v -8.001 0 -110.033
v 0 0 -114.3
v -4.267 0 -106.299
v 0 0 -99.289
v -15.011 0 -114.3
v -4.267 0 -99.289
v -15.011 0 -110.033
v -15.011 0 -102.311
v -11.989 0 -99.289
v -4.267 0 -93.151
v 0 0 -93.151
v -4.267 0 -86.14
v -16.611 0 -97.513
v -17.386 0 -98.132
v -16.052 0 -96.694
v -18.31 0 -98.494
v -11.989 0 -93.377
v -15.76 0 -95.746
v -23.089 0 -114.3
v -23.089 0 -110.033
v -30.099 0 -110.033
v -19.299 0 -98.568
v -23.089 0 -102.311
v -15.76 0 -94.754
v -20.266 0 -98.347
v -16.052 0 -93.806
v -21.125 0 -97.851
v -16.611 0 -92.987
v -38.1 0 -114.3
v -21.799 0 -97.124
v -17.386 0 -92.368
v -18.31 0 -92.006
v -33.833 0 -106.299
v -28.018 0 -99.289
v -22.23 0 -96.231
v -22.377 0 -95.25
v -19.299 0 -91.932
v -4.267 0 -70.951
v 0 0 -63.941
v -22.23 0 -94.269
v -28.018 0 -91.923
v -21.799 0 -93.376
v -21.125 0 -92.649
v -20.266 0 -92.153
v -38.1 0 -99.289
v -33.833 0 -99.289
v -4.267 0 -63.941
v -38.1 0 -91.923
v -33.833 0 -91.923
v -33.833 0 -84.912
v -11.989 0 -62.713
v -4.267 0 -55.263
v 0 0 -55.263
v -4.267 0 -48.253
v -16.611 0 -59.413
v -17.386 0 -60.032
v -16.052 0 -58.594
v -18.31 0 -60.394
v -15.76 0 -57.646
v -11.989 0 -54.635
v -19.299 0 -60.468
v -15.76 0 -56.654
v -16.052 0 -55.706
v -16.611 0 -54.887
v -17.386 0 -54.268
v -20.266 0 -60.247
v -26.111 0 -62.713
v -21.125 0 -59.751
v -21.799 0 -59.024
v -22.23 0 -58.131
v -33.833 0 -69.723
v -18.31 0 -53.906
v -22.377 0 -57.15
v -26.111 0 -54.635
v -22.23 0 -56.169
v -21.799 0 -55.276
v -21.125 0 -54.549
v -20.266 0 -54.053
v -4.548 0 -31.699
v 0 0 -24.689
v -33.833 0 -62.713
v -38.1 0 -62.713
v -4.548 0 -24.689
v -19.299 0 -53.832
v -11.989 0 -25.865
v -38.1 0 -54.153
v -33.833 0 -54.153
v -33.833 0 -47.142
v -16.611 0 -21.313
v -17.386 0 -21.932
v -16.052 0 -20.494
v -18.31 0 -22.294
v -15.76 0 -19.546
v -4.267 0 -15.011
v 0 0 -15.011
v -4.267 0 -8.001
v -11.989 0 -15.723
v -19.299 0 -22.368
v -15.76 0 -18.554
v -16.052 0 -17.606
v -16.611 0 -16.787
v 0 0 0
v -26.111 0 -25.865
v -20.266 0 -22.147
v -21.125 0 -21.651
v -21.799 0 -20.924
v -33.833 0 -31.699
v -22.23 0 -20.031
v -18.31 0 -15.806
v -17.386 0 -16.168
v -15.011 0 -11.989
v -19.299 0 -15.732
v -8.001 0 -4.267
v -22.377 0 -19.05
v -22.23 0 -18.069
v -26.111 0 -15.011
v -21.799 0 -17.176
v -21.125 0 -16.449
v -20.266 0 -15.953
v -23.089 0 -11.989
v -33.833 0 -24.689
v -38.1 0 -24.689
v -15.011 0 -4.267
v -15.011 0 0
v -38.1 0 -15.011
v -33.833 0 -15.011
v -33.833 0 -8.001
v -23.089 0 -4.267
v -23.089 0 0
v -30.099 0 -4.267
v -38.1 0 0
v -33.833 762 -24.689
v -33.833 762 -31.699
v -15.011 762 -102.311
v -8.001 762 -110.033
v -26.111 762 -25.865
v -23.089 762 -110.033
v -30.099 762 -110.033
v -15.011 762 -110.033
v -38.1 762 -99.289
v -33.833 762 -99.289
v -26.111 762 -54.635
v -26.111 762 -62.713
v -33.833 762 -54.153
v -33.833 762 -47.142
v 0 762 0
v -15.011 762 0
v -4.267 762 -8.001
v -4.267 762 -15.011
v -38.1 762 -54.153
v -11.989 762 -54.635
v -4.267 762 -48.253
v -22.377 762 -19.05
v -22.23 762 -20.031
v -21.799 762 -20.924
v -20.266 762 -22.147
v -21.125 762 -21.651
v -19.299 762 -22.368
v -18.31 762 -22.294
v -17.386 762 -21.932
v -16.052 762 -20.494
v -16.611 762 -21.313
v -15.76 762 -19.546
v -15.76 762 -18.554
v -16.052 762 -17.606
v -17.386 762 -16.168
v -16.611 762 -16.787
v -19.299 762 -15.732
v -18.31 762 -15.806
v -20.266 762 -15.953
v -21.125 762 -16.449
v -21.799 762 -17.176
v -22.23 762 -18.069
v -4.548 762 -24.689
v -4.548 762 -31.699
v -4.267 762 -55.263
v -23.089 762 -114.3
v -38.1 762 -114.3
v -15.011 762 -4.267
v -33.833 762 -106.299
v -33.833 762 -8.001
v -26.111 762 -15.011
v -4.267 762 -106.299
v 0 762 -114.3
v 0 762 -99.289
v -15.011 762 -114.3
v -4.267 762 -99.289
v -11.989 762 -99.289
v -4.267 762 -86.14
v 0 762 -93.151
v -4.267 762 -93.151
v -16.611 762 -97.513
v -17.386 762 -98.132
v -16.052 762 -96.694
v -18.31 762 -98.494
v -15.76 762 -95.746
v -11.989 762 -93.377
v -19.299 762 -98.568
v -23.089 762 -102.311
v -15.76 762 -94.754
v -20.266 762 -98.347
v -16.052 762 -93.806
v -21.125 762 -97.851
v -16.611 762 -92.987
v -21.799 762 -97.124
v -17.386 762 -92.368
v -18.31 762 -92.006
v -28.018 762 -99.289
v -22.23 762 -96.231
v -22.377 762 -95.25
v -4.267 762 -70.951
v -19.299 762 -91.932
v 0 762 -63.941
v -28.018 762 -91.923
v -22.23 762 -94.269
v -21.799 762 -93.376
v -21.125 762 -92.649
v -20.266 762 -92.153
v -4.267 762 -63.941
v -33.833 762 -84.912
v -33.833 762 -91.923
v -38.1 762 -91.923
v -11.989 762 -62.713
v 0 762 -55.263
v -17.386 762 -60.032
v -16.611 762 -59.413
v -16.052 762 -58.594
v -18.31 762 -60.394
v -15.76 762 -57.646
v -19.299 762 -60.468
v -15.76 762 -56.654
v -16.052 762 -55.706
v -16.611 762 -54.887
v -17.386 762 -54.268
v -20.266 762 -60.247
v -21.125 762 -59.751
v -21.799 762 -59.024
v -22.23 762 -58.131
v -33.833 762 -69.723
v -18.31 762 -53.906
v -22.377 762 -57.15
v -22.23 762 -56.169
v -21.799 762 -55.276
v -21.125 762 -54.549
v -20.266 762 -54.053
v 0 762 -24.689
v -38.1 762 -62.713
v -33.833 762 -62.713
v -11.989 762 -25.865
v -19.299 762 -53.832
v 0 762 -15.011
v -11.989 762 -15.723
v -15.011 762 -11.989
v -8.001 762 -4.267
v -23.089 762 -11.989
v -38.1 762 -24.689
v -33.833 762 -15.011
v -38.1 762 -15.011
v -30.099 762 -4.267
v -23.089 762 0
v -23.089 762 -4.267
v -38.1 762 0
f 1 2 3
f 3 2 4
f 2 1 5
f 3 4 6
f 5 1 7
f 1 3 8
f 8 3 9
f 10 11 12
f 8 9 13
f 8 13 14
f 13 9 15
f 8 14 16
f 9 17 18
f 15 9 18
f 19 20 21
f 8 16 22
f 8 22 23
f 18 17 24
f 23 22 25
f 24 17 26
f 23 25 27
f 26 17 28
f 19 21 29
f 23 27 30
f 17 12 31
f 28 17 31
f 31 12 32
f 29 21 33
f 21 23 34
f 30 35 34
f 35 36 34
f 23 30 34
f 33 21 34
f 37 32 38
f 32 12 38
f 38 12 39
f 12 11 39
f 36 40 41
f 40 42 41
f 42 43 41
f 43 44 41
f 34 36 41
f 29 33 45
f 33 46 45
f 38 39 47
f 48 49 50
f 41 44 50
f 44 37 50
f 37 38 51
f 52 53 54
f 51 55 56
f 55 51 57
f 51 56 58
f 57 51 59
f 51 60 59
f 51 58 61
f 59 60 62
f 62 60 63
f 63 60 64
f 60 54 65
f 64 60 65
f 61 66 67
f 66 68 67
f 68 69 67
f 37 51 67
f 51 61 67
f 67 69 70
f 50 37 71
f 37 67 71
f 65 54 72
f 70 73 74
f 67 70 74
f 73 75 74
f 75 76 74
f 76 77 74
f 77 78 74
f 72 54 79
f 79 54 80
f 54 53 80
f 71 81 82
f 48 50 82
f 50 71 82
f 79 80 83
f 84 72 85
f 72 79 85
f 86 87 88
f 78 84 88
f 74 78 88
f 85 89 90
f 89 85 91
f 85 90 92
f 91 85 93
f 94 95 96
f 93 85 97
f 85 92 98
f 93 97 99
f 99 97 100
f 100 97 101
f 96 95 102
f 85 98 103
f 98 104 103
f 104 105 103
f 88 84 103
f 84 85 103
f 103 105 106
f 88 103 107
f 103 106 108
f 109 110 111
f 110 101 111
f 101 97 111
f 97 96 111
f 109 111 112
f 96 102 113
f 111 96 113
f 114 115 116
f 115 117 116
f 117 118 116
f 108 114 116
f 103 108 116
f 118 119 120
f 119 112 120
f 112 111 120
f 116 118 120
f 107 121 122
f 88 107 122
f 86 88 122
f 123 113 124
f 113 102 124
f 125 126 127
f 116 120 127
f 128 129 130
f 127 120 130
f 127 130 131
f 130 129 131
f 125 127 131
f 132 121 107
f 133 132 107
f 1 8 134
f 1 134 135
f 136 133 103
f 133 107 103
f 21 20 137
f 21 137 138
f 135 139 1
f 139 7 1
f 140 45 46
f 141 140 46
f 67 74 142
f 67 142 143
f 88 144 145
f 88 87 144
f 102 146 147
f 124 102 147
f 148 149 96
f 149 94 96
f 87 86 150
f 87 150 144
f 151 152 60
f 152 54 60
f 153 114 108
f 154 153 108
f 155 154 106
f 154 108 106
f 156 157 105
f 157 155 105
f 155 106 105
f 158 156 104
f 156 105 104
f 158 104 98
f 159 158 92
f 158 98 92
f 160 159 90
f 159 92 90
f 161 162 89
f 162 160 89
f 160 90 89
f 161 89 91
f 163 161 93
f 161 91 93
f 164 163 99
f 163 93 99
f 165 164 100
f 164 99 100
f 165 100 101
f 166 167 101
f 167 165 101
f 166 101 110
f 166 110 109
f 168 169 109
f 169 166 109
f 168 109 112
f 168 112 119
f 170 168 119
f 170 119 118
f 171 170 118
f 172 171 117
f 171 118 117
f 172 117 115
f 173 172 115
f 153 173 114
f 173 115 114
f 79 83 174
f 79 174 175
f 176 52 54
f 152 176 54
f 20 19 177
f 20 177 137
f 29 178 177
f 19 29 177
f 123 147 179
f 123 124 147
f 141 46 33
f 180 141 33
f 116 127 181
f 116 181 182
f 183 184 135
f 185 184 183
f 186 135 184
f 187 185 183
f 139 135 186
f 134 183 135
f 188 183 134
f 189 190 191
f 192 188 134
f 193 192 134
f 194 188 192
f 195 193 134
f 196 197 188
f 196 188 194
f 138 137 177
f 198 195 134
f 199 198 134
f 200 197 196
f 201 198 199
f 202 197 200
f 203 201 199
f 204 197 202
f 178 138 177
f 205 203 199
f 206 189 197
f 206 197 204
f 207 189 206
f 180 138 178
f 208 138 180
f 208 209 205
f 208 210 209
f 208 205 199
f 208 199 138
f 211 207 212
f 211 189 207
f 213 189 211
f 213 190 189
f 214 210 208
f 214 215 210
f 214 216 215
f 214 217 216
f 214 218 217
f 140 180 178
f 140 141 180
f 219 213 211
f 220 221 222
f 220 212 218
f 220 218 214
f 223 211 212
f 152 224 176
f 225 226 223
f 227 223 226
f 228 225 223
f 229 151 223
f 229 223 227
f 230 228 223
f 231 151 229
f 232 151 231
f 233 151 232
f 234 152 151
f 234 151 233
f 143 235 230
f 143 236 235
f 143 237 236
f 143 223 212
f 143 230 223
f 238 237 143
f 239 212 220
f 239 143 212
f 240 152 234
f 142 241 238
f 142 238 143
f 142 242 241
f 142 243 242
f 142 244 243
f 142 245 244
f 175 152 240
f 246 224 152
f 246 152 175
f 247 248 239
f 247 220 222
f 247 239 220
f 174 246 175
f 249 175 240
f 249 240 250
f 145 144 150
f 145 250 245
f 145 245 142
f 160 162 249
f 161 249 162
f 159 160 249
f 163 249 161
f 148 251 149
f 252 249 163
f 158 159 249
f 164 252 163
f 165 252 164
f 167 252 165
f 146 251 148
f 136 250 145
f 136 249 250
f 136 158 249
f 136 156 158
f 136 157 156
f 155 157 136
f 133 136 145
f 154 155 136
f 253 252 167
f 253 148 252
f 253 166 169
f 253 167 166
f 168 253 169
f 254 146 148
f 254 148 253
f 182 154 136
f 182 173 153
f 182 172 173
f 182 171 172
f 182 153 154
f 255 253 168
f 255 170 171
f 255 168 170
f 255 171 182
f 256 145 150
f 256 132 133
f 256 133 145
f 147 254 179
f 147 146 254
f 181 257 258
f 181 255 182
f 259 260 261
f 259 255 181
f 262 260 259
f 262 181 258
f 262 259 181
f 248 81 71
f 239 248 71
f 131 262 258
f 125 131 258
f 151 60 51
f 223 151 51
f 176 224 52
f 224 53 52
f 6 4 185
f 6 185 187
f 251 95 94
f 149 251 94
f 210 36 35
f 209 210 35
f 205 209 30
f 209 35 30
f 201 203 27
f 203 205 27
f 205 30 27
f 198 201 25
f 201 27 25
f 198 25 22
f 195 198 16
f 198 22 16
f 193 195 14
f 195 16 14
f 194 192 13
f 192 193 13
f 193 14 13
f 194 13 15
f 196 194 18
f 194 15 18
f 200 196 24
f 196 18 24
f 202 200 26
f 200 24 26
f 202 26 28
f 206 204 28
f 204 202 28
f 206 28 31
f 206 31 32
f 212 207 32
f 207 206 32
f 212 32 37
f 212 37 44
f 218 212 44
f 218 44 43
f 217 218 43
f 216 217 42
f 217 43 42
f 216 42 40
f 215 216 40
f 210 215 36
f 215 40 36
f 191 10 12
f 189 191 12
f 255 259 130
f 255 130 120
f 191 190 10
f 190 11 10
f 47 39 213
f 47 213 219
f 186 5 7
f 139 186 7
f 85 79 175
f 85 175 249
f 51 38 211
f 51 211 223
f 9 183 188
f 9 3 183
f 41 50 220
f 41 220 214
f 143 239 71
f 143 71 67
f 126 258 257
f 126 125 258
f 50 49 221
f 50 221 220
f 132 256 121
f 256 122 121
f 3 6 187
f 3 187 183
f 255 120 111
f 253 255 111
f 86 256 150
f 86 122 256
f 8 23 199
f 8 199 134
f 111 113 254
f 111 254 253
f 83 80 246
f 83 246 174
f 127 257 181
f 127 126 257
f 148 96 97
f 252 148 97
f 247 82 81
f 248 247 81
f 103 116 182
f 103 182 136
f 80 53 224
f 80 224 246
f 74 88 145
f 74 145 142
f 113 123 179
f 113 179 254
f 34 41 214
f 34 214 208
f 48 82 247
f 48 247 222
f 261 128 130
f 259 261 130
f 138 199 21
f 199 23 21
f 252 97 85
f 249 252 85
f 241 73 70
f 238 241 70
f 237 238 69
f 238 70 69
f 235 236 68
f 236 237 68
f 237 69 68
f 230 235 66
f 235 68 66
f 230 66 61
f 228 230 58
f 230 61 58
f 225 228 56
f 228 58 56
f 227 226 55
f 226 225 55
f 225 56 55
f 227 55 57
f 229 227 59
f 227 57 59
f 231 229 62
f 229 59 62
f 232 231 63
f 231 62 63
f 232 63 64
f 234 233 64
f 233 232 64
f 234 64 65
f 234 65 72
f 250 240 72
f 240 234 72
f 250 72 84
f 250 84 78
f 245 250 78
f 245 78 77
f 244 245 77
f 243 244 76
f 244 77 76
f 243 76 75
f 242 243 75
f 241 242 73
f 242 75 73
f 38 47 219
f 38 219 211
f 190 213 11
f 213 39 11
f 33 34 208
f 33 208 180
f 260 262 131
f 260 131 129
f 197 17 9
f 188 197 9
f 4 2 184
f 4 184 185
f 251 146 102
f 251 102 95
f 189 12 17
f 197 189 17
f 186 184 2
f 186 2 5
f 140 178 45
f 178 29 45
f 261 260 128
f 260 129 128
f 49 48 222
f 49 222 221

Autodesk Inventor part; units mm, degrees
ref_plane "YZ Plane" through (0, 0, 0) normal (1, 0, 0) x (0, 1, 0)
ref_plane "XZ Plane" through (0, 0, 0) normal (0, 1, 0) x (-1, 0, 0)
ref_plane "XY Plane" through (0, 0, 0) normal (0, 0, 1) x (1, 0, 0)
sketch "Sketch1" plane through (0, 0, 0) normal (0, 1, 0) x (-1, 0, 0)
  circle A0 centre (19.05, -19.05) radius 3.3274
  circle A1 centre (19.05, -57.15) radius 3.3274
  circle A2 centre (19.05, -95.25) radius 3.3274
  line L0 (0, 0) -> (15.0114, 0)
  line L1 (15.0114, 0) -> (15.0114, -4.2672)
  line L2 (15.0114, -4.2672) -> (8.001, -4.2672)
  line L3 (38.1, 0) -> (23.0886, 0)
  line L4 (23.0886, 0) -> (23.0886, -4.2672)
  line L5 (23.0886, -4.2672) -> (30.099, -4.2672)
  line L6 (8.001, -4.2672) -> (15.0114, -11.9888)
  line L7 (30.099, -4.2672) -> (23.0886, -11.9888)
  line L8 (23.0886, -11.9888) -> (15.0114, -11.9888)
  line L9 (38.1, 0) -> (38.1, -15.0114)
  line L10 (38.1, -15.0114) -> (33.8328, -15.0114)
  line L11 (33.8328, -15.0114) -> (33.8328, -8.001)
  line L12 (26.1112, -15.0114) -> (26.1112, -25.8654)
  line L13 (33.8328, -8.001) -> (26.1112, -15.0114)
  line L14 (38.1, -24.6888) -> (33.8328, -24.6888)
  line L15 (33.8328, -24.6888) -> (33.8328, -31.6992)
  line L16 (33.8328, -31.6992) -> (26.1112, -25.8654)
  line L17 (38.1, -114.3) -> (38.1, -99.2886)
  line L18 (38.1, -99.2886) -> (33.8328, -99.2886)
  line L19 (33.8328, -99.2886) -> (33.8328, -106.299)
  line L20 (38.1, -114.3) -> (23.0886, -114.3)
  line L21 (23.0886, -114.3) -> (23.0886, -110.0328)
  line L22 (23.0886, -110.0328) -> (30.099, -110.0328)
  line L23 (0, -114.3) -> (15.0114, -114.3)
  line L24 (15.0114, -114.3) -> (15.0114, -110.0328)
  line L25 (15.0114, -110.0328) -> (8.001, -110.0328)
  line L26 (23.0886, -102.3112) -> (15.0114, -102.3112)
  line L27 (23.0886, -102.3112) -> (30.099, -110.0328)
  line L28 (15.0114, -102.3112) -> (8.001, -110.0328)
  line L29 (38.1, -24.6888) -> (38.1, -54.1528)
  line L30 (38.1, -54.1528) -> (33.8328, -54.1528)
  line L31 (33.8328, -54.1528) -> (33.8328, -47.1424)
  line L32 (26.1112, -54.6354) -> (26.1112, -62.7126)
  line L33 (33.8328, -47.1424) -> (26.1112, -54.6354)
  line L34 (38.1, -62.7126) -> (33.8328, -62.7126)
  line L35 (33.8328, -62.7126) -> (33.8328, -69.723)
  line L36 (33.8328, -69.723) -> (26.1112, -62.7126)
  line L37 (38.1, -91.9226) -> (33.8328, -91.9226)
  line L38 (33.8328, -91.9226) -> (33.8328, -84.9122)
  line L39 (38.1, -62.7126) -> (38.1, -91.9226)
  line L40 (28.0178, -91.9226) -> (28.0178, -99.2886)
  line L41 (28.0178, -99.2886) -> (33.8328, -106.299)
  line L42 (33.8328, -84.9122) -> (28.0178, -91.9226)
  line L43 (11.9888, -54.6354) -> (11.9888, -62.7126)
  line L44 (11.9888, -93.3774) -> (11.9888, -99.2886)
  line L45 (0, 0) -> (0, -15.0114)
  line L46 (0, -15.0114) -> (4.2672, -15.0114)
  line L47 (4.2672, -15.0114) -> (4.2672, -8.001)
  line L48 (11.9888, -15.7226) -> (11.9888, -25.8654)
  line L49 (4.2672, -8.001) -> (11.9888, -15.7226)
  line L50 (0, -114.3) -> (0, -99.2886)
  line L51 (0, -99.2886) -> (4.2672, -99.2886)
  line L52 (4.2672, -99.2886) -> (4.2672, -106.299)
  line L53 (4.2672, -106.299) -> (11.9888, -99.2886)
  line L54 (0, -63.9406) -> (0, -93.1506)
  line L55 (0, -93.1506) -> (4.2672, -93.1506)
  line L56 (4.2672, -93.1506) -> (4.2672, -86.1402)
  line L57 (4.2672, -86.1402) -> (11.9888, -93.3774)
  line L58 (0, -63.9406) -> (4.2672, -63.9406)
  line L59 (4.2672, -63.9406) -> (4.2672, -70.951)
  line L60 (4.2672, -70.951) -> (11.9888, -62.7126)
  line L61 (0, -55.2632) -> (0, -24.6888)
  line L62 (0, -24.6888) -> (4.5476, -24.6888)
  line L63 (4.5476, -24.6888) -> (4.5476, -31.6992)
  line L64 (4.5476, -31.6992) -> (11.9888, -25.8654)
  line L65 (0, -55.2632) -> (4.2672, -55.2632)
  line L66 (4.2672, -55.2632) -> (4.2672, -48.2528)
  line L67 (4.2672, -48.2528) -> (11.9888, -54.6354)
  dimension "d0" = 38.1
  dimension "d1" = 114.3
  dimension "d2" = 6.6548
  dimension "d3" = 6.6548
  dimension "d4" = 6.6548
  dimension "d11" = 15.0114
  dimension "d12" = 4.2672
  dimension "d14" = 15.0114
  dimension "d15" = 7.0104
  dimension "d19" = 15.0114
  dimension "d20" = 4.2672
  dimension "d21" = 7.0104
  dimension "d22" = 11.9888
  dimension "d23" = 4.2672
  dimension "d24" = 7.0104
  dimension "d25" = 9.6774
  dimension "d26" = 15.0114
  dimension "d27" = 7.0104
  dimension "d28" = 15.0114
  dimension "d29" = 4.2672
  dimension "d30" = 7.0104
  dimension "d31" = 15.0114
  dimension "d32" = 7.0104
  dimension "d33" = 11.9888
  dimension "d34" = 29.464
  dimension "d35" = 7.0104
  dimension "d36" = 8.0772
  dimension "d37" = 11.9888
  dimension "d38" = 7.0104
  dimension "d39" = 7.0104
  dimension "d40" = 15.0114
  dimension "d41" = 4.2672
  dimension "d42" = 7.0104
  dimension "d43" = 11.9888
  dimension "d44" = 11.9888
  dimension "d45" = 11.9888
  dimension "d46" = 15.0114
  dimension "d47" = 4.2672
  dimension "d48" = 7.0104
  dimension "d49" = 7.0104
  dimension "d50" = 4.2672
  dimension "d51" = 7.0104
  dimension "d52" = 29.21
  dimension "d53" = 29.21
  dimension "d54" = 7.0104
  dimension "d55" = 4.2672
  dimension "d56" = 7.0104
extrude "Extrusion1" add sketch "Sketch1" along normal blind 762
properties part number "1545rail_30inch"
